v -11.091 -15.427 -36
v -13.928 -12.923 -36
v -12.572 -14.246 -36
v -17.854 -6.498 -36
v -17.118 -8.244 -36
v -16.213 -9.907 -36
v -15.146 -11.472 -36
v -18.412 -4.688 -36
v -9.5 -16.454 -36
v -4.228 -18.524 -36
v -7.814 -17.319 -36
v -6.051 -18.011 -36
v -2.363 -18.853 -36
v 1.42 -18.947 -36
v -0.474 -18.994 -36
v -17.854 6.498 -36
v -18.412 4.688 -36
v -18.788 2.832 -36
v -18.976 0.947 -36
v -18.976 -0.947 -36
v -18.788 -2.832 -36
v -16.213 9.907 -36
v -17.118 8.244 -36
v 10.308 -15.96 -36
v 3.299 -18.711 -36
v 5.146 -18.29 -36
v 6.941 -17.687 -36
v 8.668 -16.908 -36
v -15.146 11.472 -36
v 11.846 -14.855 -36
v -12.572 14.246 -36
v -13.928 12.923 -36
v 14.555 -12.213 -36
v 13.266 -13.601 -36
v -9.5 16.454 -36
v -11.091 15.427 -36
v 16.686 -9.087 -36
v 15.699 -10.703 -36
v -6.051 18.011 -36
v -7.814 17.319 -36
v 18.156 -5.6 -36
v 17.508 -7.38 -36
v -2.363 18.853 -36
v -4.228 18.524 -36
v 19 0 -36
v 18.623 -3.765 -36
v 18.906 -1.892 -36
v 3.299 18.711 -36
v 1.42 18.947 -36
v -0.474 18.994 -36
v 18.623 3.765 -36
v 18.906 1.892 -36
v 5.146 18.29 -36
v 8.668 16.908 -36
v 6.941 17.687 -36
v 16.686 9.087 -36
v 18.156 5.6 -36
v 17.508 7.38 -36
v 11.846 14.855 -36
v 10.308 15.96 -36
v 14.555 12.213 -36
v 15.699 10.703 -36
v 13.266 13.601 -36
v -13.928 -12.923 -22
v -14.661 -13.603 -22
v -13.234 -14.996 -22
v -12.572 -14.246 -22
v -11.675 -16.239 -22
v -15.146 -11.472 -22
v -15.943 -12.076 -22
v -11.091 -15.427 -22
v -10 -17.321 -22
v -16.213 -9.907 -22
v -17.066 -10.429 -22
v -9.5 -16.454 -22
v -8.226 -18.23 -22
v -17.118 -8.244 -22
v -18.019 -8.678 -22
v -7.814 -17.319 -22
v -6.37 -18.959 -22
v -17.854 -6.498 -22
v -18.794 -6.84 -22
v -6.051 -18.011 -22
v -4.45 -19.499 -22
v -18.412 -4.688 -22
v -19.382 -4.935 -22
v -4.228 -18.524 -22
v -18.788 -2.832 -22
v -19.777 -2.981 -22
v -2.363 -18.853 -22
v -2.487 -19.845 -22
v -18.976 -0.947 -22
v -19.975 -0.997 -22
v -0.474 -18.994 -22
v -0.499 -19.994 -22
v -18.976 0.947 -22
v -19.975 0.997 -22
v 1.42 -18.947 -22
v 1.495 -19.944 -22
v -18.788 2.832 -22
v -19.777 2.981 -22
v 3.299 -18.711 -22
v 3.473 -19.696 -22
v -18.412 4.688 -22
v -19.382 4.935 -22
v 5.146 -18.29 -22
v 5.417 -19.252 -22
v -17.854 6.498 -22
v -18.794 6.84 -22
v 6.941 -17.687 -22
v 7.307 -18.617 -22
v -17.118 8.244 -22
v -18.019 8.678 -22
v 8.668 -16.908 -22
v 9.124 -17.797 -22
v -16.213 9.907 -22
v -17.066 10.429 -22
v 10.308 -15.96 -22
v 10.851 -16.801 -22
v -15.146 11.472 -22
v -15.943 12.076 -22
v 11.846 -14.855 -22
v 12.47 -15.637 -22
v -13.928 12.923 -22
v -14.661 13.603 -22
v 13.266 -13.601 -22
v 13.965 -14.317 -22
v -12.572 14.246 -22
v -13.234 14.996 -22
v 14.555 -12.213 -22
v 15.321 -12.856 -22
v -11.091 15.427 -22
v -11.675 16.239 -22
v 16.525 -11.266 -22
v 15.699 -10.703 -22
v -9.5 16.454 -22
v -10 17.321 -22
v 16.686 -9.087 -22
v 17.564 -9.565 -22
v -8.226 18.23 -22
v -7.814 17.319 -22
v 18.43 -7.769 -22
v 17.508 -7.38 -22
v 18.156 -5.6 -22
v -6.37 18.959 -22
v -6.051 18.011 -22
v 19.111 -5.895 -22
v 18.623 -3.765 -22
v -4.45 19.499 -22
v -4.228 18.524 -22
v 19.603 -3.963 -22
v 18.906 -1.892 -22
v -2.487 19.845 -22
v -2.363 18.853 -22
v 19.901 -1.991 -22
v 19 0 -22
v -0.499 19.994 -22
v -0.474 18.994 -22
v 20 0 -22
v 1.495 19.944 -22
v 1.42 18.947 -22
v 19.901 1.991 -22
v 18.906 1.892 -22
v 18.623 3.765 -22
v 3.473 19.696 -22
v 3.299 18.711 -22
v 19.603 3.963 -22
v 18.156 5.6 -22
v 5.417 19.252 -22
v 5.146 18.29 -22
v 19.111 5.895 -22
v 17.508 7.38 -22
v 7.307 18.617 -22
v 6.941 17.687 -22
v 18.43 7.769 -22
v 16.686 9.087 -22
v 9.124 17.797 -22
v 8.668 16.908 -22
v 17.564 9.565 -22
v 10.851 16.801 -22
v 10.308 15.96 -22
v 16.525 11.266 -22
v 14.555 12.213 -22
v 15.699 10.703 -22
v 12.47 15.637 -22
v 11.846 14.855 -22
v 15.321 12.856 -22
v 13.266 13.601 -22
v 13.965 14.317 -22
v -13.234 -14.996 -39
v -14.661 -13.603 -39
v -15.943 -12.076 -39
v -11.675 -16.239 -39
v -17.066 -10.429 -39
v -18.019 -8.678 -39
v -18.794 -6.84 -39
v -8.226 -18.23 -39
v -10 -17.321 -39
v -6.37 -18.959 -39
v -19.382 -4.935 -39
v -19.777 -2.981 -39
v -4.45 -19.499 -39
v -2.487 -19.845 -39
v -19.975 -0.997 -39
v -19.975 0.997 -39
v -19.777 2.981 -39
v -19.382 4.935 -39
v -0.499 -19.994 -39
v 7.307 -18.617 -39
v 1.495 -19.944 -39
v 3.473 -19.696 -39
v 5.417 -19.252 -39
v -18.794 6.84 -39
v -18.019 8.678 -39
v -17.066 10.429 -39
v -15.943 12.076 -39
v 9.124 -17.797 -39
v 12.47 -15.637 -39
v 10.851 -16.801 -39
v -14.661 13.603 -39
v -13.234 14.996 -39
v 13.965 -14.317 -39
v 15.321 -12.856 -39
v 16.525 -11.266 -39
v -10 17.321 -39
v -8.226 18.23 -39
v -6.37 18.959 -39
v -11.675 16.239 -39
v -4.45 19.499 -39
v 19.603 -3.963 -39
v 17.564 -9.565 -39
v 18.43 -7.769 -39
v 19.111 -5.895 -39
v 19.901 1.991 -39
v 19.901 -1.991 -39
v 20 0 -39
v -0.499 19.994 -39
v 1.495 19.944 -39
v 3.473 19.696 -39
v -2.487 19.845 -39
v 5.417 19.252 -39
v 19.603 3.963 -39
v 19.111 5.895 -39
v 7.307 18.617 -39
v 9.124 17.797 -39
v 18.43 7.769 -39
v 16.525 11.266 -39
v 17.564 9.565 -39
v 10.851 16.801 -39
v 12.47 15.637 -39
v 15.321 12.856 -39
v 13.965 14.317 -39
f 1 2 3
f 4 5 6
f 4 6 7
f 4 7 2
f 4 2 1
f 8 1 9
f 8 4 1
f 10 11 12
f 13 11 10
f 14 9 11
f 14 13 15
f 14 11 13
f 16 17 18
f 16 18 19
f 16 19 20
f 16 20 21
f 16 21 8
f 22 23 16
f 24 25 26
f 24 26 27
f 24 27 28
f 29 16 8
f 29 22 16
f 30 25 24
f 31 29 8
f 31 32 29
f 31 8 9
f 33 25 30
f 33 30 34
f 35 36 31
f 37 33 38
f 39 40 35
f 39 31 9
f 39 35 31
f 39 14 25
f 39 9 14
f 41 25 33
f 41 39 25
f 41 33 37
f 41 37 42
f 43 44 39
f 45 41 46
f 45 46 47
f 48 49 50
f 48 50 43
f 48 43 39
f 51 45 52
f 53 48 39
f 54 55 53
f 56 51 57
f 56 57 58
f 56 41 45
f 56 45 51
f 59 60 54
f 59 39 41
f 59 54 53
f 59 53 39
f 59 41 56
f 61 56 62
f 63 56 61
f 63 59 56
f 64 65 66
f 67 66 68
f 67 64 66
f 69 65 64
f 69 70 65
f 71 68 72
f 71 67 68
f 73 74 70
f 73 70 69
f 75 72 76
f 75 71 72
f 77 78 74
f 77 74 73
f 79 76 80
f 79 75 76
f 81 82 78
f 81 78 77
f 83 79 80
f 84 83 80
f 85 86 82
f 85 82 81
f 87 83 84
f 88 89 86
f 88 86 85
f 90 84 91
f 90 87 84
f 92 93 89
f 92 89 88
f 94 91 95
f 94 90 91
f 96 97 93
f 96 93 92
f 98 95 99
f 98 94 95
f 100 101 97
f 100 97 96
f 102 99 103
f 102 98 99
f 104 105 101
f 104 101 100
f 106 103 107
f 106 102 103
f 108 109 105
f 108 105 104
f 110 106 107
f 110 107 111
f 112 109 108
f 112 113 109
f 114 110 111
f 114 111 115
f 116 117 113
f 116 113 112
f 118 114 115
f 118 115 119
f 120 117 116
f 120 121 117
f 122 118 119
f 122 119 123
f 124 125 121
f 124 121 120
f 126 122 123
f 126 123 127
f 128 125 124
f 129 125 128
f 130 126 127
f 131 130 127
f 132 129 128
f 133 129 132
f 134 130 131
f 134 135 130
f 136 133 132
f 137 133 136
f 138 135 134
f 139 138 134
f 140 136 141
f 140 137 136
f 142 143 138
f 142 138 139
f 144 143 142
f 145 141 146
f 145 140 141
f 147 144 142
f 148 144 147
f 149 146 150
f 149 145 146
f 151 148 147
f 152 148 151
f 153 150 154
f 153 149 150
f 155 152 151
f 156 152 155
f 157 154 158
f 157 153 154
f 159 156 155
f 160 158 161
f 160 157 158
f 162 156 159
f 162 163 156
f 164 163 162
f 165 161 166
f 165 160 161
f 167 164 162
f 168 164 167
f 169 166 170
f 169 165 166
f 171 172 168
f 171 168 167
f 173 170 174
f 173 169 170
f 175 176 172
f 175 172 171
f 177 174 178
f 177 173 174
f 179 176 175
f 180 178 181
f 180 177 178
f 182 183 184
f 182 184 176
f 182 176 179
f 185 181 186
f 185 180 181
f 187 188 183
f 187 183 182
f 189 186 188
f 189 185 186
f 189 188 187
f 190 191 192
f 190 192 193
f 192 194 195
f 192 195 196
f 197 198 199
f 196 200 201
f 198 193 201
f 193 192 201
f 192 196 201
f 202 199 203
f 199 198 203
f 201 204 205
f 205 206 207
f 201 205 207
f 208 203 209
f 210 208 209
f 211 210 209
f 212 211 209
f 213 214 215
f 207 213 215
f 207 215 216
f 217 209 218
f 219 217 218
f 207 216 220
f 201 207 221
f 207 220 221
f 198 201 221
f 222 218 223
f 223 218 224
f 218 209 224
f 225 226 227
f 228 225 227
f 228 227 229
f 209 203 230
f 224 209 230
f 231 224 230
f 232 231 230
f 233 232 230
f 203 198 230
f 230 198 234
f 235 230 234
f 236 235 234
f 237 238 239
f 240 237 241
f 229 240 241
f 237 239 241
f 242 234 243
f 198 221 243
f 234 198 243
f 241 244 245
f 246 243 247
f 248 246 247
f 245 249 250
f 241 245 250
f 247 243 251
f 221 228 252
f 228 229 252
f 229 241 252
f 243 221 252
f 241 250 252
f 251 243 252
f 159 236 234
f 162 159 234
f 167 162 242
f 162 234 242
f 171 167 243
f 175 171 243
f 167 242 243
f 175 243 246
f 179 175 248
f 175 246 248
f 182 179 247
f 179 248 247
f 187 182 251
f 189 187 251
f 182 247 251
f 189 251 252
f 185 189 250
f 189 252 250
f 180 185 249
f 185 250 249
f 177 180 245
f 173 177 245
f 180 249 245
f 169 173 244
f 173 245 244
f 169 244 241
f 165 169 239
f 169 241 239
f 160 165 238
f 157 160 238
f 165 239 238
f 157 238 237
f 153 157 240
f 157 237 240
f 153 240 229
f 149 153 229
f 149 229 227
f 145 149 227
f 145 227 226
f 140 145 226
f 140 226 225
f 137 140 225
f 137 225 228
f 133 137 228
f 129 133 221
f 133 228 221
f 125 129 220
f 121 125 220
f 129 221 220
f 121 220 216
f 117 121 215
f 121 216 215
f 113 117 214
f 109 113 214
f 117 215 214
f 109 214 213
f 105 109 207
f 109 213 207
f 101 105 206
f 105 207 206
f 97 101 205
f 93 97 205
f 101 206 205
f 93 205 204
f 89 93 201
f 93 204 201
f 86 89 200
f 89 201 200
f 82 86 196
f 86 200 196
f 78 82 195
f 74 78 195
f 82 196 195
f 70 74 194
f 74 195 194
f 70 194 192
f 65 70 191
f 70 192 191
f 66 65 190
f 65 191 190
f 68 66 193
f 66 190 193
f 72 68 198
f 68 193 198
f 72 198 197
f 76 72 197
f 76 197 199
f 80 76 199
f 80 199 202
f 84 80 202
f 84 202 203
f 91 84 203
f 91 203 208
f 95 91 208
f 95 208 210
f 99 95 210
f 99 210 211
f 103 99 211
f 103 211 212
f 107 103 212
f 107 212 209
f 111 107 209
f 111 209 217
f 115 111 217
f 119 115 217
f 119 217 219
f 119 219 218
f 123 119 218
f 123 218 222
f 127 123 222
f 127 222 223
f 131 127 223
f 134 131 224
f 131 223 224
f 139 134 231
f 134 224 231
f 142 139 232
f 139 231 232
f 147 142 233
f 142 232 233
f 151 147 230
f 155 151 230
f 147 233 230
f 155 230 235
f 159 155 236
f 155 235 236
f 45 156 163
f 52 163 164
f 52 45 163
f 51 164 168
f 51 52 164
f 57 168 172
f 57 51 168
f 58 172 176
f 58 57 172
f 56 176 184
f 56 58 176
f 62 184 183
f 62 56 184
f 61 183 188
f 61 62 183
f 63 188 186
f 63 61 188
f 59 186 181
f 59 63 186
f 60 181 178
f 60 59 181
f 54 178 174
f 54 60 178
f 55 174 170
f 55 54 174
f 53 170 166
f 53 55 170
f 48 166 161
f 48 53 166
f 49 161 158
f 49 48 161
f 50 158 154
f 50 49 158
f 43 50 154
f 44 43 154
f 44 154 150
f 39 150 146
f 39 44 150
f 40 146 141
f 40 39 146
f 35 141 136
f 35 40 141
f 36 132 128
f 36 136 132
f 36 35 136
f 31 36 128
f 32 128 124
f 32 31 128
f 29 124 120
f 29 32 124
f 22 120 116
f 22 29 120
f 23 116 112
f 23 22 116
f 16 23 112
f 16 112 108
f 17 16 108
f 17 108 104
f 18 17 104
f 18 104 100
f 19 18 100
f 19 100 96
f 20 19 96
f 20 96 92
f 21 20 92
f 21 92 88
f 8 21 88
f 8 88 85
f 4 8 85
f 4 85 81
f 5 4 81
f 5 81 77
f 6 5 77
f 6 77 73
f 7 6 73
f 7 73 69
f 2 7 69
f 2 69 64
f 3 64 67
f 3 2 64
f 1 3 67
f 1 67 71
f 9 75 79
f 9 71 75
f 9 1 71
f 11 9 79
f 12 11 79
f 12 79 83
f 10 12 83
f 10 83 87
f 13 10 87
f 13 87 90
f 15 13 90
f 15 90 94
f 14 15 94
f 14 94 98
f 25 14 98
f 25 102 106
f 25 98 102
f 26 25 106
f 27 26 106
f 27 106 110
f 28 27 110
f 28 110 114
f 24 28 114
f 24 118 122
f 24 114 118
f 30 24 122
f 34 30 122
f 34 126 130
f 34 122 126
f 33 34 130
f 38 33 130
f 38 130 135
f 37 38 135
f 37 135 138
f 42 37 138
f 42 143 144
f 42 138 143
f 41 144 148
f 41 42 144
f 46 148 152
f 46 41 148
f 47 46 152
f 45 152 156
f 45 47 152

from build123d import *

# Parameters (mm, degrees)
CYLINDER004_R     = 19
CYLINDER004_DEPTH = 15
CYLINDER003_R     = 20
CYLINDER003_DEPTH = 17


with BuildPart() as cylinder001:
    # Cylinder004 → Cylinder004 (new body)
    with BuildSketch(Plane.XY.offset(3)):
        Circle(CYLINDER004_R)
    extrude(amount=CYLINDER004_DEPTH)


with BuildPart() as tapon:
    # Cylinder003 → Cylinder003 (new body)
    with BuildSketch(Plane.XY):
        Circle(CYLINDER003_R)
    extrude(amount=CYLINDER003_DEPTH)

    # Cut003: cut Cylinder001
    add(cylinder001.part, mode=Mode.SUBTRACT)


with BuildPart() as tapon_1:
    # Cut003 placement: moved
    add(tapon.part.moved(Location((0, 0, -39))))


solid = tapon_1.part
